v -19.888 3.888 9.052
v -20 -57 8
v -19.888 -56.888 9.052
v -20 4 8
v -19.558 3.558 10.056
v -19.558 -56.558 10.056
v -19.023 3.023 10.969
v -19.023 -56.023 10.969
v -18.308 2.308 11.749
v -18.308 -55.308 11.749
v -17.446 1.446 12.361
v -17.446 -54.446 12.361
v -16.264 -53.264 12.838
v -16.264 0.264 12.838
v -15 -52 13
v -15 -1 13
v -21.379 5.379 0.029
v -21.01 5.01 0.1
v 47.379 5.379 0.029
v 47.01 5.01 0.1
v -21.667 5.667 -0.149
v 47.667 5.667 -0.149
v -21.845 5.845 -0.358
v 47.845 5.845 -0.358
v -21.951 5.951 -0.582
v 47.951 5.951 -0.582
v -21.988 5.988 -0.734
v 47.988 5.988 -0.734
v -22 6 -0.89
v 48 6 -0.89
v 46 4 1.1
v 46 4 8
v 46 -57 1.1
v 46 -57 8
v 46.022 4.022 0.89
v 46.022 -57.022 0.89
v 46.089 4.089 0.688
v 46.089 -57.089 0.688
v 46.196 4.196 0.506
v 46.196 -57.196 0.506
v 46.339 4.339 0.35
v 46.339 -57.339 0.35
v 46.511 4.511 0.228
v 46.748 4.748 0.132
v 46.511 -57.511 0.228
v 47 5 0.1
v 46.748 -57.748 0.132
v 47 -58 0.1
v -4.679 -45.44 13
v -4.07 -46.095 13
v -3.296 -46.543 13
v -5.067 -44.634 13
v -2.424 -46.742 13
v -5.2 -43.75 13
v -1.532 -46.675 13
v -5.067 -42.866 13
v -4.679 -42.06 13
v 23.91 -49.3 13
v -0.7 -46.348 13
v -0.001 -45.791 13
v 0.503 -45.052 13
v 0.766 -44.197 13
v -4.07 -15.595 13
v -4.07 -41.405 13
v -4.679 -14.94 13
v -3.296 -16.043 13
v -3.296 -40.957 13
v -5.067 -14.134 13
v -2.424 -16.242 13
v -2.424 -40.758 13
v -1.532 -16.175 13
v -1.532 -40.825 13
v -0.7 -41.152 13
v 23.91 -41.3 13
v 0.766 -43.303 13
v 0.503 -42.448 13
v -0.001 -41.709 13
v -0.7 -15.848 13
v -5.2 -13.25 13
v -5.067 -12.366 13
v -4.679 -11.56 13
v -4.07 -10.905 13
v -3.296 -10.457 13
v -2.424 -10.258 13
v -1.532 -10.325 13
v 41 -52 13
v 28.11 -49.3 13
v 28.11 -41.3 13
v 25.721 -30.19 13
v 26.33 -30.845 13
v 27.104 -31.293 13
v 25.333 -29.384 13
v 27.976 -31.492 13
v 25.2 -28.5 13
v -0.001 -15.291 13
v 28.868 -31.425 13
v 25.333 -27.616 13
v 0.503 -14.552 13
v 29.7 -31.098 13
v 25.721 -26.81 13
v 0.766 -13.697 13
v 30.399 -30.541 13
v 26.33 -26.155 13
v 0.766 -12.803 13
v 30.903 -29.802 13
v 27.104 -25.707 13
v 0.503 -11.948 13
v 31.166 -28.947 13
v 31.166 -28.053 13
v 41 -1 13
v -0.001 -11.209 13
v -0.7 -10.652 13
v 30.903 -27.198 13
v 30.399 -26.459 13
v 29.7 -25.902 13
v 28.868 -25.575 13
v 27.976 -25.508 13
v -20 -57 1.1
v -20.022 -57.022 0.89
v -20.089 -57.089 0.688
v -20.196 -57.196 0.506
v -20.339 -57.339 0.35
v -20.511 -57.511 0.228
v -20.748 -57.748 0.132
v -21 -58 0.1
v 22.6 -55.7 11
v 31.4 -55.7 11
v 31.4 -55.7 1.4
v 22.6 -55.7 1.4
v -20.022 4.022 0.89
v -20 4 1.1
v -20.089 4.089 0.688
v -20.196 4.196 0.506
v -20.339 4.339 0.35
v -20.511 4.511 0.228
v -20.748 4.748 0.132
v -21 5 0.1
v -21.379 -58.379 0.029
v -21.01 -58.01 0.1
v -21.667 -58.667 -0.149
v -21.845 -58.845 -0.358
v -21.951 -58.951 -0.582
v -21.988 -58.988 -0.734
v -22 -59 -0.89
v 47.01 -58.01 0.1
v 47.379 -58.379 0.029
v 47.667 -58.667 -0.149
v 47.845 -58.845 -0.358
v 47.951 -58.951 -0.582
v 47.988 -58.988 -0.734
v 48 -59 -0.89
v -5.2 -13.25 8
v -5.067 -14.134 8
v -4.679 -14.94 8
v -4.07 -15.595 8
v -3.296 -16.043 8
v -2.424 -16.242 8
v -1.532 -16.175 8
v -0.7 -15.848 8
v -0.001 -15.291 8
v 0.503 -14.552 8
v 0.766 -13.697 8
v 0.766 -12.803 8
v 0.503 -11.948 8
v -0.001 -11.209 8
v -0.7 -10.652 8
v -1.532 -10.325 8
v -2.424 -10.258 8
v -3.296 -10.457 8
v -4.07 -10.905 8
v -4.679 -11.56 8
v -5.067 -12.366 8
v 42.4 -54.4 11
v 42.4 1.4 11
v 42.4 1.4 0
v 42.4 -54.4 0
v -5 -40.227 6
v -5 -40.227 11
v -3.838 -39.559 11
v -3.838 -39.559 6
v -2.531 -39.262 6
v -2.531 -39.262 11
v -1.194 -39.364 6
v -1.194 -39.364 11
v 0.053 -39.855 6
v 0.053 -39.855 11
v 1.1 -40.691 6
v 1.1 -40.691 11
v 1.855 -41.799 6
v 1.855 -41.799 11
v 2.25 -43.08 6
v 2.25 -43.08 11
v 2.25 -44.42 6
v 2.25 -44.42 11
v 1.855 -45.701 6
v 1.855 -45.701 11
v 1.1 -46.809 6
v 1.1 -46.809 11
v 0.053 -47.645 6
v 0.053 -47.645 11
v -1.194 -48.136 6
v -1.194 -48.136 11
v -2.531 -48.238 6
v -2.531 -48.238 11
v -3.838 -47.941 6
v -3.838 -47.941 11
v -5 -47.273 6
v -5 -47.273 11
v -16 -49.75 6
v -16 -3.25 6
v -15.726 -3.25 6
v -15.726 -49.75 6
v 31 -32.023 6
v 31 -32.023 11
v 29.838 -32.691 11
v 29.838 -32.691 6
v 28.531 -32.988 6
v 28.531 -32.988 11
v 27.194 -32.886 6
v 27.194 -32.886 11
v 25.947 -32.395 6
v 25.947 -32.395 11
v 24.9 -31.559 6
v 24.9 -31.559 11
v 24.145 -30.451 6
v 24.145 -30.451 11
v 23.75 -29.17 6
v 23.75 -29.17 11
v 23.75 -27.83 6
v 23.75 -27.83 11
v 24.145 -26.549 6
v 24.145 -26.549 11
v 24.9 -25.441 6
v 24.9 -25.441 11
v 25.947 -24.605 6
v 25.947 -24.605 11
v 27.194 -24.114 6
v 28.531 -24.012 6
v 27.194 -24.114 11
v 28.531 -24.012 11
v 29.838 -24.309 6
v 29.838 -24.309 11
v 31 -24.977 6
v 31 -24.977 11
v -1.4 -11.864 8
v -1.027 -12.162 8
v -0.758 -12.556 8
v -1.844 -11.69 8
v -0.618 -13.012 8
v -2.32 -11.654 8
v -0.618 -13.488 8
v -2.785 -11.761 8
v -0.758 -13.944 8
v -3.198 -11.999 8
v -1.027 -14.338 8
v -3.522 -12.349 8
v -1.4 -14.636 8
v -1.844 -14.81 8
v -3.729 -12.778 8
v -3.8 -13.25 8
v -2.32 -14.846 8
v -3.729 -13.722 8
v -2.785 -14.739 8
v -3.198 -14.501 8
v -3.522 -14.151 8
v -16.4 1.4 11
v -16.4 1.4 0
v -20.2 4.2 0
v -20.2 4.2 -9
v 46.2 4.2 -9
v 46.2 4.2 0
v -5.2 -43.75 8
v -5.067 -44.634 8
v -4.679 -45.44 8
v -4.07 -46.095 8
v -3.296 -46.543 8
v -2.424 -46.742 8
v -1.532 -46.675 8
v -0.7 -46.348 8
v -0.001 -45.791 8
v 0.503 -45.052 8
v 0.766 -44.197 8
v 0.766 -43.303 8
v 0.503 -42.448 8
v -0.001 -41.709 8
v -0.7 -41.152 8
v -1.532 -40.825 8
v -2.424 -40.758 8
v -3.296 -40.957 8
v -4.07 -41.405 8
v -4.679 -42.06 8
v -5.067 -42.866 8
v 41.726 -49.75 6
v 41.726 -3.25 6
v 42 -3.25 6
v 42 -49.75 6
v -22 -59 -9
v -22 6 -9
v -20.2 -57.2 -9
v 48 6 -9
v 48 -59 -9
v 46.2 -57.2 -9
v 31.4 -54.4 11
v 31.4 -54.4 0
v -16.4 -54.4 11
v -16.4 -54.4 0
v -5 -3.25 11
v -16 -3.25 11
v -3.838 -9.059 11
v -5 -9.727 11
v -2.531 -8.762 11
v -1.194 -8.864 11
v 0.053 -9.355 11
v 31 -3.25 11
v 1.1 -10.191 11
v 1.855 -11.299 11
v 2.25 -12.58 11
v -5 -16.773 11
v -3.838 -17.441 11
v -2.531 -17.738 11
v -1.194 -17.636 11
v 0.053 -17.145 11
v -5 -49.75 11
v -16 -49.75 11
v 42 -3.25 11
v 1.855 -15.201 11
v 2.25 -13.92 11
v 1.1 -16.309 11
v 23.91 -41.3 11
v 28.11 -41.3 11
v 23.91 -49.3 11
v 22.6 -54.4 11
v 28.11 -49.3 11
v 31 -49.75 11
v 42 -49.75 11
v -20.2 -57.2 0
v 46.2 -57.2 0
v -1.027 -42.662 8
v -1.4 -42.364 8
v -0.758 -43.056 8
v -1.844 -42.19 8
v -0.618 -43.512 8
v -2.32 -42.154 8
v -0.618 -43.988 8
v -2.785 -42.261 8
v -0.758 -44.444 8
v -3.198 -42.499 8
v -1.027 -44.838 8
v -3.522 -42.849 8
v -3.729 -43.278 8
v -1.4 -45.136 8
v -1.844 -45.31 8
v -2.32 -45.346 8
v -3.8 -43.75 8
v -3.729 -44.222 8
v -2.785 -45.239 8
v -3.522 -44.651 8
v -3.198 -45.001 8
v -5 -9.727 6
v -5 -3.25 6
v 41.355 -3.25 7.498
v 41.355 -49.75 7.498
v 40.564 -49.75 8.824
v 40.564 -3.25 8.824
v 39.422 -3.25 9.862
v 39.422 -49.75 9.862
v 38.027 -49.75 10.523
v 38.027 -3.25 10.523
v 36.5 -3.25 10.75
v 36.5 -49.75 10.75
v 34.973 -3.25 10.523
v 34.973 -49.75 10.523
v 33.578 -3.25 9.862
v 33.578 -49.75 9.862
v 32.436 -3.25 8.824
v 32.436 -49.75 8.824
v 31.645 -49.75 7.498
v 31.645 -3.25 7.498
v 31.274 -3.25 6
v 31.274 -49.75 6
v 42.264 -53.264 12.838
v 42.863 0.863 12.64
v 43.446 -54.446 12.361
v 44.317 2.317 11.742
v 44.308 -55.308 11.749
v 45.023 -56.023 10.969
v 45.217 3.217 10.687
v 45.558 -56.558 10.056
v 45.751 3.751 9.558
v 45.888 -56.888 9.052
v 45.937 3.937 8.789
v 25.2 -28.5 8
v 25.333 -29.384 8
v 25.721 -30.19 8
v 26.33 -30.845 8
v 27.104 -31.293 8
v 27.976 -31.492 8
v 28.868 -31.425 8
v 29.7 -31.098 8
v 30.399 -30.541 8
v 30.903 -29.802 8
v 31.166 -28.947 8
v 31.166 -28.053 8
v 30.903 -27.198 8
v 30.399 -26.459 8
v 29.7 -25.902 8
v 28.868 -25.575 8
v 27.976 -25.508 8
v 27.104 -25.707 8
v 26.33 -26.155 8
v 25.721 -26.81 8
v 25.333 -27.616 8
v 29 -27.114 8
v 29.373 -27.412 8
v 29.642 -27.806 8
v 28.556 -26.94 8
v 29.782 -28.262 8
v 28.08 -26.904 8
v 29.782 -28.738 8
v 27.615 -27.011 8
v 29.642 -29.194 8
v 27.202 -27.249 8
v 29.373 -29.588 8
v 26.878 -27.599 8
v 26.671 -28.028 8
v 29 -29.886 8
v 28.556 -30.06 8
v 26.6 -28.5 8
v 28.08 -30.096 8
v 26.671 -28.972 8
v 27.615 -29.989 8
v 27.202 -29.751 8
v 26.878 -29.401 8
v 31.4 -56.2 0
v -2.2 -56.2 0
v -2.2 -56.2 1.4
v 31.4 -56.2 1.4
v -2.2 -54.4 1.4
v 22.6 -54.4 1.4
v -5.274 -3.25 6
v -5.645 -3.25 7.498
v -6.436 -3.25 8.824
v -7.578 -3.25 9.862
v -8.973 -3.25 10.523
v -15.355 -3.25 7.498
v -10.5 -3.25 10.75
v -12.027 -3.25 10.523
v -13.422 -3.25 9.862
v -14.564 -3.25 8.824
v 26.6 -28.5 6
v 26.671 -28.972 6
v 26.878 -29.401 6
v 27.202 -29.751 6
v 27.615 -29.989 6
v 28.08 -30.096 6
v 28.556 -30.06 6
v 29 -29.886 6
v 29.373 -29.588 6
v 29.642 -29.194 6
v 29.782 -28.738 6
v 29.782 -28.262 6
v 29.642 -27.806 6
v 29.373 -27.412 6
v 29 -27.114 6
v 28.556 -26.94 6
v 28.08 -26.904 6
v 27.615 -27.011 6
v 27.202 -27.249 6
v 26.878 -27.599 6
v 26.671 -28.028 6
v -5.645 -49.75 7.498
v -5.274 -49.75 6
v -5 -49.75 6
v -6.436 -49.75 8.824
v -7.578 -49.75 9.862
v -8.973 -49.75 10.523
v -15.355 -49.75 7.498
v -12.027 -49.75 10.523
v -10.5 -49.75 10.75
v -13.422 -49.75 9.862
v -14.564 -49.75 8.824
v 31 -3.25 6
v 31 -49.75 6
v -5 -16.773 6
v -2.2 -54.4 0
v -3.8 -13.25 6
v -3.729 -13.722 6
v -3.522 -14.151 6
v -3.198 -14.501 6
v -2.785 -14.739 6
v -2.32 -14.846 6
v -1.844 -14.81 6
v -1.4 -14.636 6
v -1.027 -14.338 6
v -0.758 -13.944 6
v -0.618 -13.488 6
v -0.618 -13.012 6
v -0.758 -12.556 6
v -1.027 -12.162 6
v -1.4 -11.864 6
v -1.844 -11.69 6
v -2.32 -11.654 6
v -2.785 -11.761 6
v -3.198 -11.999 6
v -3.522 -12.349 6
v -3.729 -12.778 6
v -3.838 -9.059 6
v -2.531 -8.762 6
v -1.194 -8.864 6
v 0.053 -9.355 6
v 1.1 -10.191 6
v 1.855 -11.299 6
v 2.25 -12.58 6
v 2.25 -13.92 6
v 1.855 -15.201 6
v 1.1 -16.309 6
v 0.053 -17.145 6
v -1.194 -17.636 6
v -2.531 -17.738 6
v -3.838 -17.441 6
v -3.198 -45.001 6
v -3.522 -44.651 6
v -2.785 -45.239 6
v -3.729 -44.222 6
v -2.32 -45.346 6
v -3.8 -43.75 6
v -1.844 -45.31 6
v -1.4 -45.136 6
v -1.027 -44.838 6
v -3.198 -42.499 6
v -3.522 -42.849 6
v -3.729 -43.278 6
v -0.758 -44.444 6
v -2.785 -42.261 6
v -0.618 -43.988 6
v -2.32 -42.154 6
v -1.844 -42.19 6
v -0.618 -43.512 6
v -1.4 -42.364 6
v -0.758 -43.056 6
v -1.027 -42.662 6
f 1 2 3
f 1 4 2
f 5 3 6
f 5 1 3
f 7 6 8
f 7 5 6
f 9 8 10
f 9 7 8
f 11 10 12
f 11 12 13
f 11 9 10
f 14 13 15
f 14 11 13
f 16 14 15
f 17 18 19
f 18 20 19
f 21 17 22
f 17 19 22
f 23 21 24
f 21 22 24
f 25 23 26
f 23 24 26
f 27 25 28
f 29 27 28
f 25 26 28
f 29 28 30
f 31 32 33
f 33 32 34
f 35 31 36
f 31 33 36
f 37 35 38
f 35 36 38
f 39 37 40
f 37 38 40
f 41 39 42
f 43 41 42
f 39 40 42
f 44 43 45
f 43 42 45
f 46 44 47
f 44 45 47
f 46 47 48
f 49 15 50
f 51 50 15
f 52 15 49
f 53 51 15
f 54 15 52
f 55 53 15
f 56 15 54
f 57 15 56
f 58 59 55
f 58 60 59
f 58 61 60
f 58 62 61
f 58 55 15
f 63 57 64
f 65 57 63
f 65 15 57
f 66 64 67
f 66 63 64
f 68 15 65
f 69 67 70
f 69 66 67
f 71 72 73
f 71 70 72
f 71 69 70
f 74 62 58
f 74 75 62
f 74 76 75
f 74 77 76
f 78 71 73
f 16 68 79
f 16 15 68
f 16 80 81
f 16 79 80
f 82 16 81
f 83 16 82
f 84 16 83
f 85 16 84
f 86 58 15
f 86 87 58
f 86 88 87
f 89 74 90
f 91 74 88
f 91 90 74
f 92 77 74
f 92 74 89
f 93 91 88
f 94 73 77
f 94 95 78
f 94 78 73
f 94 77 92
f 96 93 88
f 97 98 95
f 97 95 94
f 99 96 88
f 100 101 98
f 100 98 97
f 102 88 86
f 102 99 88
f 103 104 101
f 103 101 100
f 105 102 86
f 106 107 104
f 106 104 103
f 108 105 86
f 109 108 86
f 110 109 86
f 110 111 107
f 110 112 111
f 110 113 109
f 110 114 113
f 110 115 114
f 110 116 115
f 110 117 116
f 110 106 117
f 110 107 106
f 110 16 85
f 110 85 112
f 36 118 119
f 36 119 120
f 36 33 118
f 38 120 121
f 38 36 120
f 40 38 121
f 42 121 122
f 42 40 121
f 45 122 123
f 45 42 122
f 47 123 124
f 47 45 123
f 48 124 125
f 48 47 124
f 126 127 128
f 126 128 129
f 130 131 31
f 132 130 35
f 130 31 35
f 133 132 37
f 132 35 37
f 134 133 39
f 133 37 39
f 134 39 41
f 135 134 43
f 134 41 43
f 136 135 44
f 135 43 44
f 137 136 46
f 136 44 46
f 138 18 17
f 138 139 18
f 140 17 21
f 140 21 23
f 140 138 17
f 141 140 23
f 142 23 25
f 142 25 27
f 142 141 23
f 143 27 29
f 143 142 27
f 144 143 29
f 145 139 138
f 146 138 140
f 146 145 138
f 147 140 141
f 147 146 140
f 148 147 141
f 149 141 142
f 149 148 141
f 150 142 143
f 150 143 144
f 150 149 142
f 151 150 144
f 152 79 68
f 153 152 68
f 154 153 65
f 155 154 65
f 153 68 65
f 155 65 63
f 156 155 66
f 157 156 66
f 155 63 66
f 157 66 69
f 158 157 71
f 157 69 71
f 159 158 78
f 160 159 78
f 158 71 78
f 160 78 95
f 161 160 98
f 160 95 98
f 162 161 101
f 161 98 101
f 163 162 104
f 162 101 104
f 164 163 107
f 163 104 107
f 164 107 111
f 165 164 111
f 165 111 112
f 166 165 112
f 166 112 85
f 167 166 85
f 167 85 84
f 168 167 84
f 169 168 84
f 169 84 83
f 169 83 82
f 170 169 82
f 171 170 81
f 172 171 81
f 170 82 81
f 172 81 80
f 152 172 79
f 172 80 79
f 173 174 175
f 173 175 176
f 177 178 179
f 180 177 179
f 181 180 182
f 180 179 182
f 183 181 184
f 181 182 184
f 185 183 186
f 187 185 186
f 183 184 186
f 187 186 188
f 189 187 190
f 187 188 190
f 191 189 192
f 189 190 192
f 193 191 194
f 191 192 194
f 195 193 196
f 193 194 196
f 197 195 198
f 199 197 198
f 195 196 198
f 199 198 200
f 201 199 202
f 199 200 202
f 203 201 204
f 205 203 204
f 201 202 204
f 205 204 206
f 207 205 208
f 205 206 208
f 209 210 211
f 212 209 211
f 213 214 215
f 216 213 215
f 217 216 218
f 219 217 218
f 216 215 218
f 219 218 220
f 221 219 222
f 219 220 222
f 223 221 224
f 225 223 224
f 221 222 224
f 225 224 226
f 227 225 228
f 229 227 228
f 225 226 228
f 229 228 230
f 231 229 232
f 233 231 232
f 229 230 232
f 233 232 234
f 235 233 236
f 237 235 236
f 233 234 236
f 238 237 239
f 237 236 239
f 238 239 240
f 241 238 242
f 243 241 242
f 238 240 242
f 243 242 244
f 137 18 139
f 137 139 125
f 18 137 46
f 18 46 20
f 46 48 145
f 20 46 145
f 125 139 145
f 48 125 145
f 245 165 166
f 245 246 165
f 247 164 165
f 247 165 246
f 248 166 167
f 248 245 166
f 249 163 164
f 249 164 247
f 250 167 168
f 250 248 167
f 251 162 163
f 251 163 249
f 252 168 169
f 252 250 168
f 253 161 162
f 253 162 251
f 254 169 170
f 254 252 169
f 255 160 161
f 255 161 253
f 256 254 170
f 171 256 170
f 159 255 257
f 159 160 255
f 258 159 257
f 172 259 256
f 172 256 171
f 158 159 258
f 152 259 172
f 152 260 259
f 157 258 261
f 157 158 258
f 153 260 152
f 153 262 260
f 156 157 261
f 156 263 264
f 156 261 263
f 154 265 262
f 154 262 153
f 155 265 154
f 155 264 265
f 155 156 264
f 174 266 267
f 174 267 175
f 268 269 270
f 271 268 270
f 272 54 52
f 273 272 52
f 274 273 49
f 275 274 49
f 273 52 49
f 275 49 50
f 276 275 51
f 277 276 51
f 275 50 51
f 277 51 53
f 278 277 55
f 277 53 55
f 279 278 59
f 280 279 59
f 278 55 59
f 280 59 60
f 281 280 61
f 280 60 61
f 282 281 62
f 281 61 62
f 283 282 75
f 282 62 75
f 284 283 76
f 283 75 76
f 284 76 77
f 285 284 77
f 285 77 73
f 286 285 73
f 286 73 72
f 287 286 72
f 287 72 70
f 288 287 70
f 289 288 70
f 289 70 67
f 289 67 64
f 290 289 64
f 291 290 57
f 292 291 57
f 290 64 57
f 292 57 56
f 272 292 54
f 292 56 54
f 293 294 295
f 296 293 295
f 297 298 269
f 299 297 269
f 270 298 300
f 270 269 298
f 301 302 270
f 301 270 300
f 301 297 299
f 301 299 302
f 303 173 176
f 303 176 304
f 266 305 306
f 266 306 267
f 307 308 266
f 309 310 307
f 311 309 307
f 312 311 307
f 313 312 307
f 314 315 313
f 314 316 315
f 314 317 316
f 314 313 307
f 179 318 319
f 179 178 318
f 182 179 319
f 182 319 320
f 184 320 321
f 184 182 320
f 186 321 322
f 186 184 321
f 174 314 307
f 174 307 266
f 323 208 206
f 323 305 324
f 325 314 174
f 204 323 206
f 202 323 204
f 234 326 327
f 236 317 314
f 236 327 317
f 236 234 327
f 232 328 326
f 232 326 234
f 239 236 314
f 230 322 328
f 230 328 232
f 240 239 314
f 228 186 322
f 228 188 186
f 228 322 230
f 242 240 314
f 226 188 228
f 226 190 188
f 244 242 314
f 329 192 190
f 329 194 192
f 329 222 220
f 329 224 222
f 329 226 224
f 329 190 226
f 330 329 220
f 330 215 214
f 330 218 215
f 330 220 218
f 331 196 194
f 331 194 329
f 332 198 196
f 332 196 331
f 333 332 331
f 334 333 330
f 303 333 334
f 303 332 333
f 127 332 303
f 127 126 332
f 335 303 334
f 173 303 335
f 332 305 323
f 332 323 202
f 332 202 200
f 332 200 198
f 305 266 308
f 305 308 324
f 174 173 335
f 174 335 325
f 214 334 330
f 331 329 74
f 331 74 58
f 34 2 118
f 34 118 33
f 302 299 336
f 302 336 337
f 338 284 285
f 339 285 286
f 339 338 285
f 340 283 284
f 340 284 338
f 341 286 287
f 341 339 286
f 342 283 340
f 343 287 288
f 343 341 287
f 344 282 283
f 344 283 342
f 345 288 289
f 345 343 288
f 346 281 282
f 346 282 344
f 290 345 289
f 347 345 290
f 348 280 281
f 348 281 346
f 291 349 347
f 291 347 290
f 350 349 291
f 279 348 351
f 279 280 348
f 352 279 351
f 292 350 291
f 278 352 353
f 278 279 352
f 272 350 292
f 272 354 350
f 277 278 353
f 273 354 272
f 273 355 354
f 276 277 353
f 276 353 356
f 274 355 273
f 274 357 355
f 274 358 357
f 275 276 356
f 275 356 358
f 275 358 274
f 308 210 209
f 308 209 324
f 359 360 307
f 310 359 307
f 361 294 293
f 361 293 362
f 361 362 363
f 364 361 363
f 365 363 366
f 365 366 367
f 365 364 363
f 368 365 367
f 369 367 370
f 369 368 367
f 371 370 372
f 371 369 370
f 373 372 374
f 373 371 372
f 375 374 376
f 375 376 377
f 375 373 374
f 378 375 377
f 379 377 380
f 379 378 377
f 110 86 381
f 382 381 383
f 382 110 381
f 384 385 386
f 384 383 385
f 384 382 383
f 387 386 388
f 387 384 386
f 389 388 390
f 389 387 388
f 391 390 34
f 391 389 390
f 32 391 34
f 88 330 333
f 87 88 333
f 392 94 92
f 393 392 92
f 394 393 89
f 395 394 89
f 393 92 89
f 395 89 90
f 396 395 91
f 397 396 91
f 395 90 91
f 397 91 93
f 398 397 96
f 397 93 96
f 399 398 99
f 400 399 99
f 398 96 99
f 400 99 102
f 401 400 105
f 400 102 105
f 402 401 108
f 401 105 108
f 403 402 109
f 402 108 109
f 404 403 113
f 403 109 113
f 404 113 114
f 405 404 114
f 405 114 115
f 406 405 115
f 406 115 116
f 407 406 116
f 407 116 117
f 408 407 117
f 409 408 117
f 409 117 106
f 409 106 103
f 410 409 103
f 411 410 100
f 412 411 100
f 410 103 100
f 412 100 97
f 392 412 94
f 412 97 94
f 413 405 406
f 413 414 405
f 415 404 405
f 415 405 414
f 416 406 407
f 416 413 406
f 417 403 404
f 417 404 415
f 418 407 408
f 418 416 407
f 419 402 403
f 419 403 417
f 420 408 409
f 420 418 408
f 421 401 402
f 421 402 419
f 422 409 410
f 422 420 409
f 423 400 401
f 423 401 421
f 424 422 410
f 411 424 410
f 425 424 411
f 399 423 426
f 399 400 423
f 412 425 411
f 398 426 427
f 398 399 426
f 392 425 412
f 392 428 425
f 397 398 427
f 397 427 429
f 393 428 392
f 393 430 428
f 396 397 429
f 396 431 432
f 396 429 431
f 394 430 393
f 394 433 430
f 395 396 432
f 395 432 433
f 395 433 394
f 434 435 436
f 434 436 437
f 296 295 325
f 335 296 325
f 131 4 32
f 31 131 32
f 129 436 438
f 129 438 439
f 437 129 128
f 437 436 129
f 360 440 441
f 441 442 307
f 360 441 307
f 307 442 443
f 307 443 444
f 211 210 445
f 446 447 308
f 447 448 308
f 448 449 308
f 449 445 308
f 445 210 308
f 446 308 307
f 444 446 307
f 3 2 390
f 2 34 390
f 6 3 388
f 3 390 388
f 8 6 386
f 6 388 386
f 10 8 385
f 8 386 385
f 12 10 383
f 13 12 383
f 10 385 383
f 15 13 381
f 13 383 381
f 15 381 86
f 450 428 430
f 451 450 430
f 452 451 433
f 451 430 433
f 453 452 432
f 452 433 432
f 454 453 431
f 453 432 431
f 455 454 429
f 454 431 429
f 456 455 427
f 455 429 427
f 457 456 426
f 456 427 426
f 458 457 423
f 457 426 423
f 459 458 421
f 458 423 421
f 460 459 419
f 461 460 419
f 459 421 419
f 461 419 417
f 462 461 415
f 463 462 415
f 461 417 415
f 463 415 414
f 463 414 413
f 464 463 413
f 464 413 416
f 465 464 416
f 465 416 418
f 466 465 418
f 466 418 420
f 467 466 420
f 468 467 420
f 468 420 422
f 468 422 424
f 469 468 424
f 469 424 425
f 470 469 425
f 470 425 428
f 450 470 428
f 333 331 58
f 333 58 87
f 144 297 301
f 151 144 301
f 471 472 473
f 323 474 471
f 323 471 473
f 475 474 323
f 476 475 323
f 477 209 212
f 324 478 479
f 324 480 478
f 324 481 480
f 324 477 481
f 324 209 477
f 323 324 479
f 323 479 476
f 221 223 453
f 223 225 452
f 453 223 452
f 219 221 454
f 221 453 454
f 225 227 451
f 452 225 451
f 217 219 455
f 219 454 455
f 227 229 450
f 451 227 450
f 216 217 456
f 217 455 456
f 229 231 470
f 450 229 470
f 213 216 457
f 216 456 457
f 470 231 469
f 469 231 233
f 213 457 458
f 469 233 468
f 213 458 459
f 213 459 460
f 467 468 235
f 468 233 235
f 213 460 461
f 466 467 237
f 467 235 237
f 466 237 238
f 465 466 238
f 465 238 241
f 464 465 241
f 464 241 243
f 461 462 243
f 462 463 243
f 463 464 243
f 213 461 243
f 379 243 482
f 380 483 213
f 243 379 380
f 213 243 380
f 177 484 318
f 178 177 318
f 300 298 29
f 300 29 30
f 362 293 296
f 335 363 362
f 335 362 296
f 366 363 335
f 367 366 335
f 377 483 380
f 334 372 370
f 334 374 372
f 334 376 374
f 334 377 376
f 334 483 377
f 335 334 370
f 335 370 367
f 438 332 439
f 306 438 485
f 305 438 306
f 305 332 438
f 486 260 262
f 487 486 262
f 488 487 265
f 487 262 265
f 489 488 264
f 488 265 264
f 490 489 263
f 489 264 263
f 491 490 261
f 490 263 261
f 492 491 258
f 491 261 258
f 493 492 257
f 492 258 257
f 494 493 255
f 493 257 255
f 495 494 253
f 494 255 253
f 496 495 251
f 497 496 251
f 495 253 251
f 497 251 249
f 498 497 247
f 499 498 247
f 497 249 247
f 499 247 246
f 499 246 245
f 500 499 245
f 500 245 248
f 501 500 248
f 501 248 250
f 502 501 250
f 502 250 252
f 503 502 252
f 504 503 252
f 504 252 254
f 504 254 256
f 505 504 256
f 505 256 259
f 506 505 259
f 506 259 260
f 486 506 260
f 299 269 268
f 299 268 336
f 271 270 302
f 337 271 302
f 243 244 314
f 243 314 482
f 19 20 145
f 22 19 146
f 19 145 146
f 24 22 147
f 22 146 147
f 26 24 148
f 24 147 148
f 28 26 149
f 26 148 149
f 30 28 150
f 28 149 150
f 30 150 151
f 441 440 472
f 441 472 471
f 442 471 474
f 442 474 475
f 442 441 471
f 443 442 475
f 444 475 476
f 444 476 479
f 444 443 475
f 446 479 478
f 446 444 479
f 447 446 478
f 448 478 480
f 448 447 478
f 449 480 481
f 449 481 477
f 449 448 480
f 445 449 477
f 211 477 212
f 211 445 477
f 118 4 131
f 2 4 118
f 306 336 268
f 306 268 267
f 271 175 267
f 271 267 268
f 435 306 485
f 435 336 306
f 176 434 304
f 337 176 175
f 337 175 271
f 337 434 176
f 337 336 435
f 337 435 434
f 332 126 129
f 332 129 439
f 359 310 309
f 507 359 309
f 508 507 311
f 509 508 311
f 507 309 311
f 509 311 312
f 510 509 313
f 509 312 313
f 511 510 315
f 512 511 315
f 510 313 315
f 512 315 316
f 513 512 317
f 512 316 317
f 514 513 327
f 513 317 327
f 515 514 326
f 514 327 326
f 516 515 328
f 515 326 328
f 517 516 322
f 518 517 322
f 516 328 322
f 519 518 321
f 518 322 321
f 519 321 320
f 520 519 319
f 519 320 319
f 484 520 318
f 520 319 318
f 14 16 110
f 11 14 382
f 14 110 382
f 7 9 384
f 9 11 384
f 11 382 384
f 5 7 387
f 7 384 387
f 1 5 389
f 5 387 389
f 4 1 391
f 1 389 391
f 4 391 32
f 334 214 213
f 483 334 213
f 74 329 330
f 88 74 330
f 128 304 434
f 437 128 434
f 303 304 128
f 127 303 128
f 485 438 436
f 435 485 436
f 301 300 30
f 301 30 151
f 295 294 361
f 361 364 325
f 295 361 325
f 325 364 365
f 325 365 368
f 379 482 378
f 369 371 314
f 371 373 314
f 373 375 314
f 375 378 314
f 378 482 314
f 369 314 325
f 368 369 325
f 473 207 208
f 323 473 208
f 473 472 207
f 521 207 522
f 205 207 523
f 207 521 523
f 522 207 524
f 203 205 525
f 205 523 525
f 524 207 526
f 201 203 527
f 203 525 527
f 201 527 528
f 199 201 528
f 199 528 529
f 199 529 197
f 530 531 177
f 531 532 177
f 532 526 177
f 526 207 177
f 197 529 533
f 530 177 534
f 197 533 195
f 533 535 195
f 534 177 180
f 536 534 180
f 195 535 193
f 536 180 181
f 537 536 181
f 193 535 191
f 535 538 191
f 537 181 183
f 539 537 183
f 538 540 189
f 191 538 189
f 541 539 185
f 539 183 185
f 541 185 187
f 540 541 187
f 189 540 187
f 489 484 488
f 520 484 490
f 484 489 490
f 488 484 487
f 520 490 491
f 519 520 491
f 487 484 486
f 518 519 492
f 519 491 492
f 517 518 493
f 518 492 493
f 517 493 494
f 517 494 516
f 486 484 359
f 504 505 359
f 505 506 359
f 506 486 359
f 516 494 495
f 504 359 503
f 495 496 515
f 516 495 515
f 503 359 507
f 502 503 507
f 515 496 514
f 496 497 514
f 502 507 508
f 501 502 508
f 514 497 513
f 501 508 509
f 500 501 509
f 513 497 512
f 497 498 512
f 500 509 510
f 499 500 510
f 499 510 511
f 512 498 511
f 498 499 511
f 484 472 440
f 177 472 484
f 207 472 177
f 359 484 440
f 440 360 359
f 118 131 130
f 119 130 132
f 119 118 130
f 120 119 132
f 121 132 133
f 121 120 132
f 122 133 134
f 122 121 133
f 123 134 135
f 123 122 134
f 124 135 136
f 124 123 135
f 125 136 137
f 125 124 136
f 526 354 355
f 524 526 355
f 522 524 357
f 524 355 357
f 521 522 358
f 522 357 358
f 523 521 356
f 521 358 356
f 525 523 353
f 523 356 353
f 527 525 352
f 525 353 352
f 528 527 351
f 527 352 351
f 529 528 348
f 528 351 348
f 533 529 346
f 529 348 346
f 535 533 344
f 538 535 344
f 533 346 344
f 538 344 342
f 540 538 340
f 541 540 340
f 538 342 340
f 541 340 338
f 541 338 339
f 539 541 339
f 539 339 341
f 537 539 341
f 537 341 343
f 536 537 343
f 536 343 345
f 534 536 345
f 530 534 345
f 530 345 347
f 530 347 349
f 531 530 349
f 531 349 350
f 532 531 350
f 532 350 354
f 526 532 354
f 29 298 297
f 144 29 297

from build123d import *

# Parameters (mm, degrees)
PAD007_DEPTH      = 46.5
SKETCH012_W       = 58
SKETCH012_H       = 2
PAD008_DEPTH      = 46.5
SKETCH013_W       = 2
SKETCH013_H       = 46.5
PAD009_DEPTH      = 62
SKETCH014_W       = 2
SKETCH014_H       = 46.5
PAD010_DEPTH      = 4
SKETCH015_W       = 66
SKETCH015_H       = 2
PAD011_DEPTH      = 7.25
SKETCH016_W       = 66
SKETCH016_H       = 2
PAD012_DEPTH      = 7.25
SKETCH017_W       = 66
SKETCH017_H       = 61
PAD013_DEPTH      = 9.8
SKETCH018_W       = 66
SKETCH018_H       = 61
PAD014_DEPTH      = 1.2
PAD015_DEPTH      = 5
SKETCH020_R       = 2.8
POCKET003_DEPTH   = 5
SKETCH021_R       = 1.5
POCKET004_DEPTH   = 8
SKETCH031_W       = 3.2
SKETCH031_H       = 7
POCKET010_DEPTH   = 5
FILLET_R          = 5
POCKET011_DEPTH   = 11
SKETCH034_W       = 33.6
SKETCH034_H       = 1.8
POCKET012_DEPTH   = 1.4
SKETCH035_W       = 70
SKETCH035_H       = 65
SKETCH035_W_2     = 66
SKETCH035_H_2     = 61
PAD019_DEPTH      = 9
PAD019_DEPTH_BACK = 0.1
FILLET001_R       = 1
FILLET002_R       = 0.99
SKETCH036_W       = 66.4
SKETCH036_H       = 61.4
POCKET013_DEPTH   = 9
SKETCH037_W       = 4.2
SKETCH037_H       = 8
POCKET014_DEPTH   = 5
SKETCH038_R       = 3
POCKET015_DEPTH   = 5
SKETCH039_R       = 1.6
POCKET016_DEPTH   = 5


with BuildPart() as part:
    # Sketch011 (on DatumPlane) → Pad007 (new body)
    with BuildSketch(Plane.XZ.offset(3.25)):
        with BuildLine():
            Line((-5, 11), (-16, 11))
            Line((-16, 11), (-16, 6))
            Line((-16, 6), (-15.726136, 6))
            ThreePointArc((-5.273864, 6), (-10.5, 10.75), (-15.726136, 6))
            Line((-5.273864, 6), (-5, 6))
            Line((-5, 6), (-5, 11))
        make_face()
    extrude(amount=PAD007_DEPTH)

    # Sketch012 (on DatumPlane) → Pad008 (join)
    with BuildSketch(Plane.XZ.offset(3.25)):
        with BuildLine():
            Line((42, 11), (31, 11))
            Line((31, 11), (31, 6))
            Line((31, 6), (31.273864, 6))
            ThreePointArc((41.726136, 6), (36.5, 10.75), (31.273864, 6))
            Line((41.726136, 6), (42, 6))
            Line((42, 6), (42, 11))
        make_face()
        with Locations((13, 12)):
            Rectangle(SKETCH012_W, SKETCH012_H)
    extrude(amount=PAD008_DEPTH)

    # Sketch013 (on Face17 of Pad008) → Pad009 (join)
    with BuildSketch(Plane(origin=(42, -3.25, 0), x_dir=(0, 0, 1), z_dir=(1, 0, 0))):
        with Locations((12, 23.25)):
            Rectangle(SKETCH013_W, SKETCH013_H)
    extrude(amount=-PAD009_DEPTH)

    # Sketch014 (on Face17 of Pad009) → Pad010 (join)
    with BuildSketch(Plane(origin=(42, -3.25, 0), x_dir=(0, 0, 1), z_dir=(1, 0, 0))):
        with Locations((12, 23.25)):
            Rectangle(SKETCH014_W, SKETCH014_H)
    extrude(amount=PAD010_DEPTH)

    # Sketch015 (on Face10 of Pad010) → Pad011 (join)
    with BuildSketch(Plane(origin=(0, -3.25, 0), x_dir=(1, 0, 0), z_dir=(0, 1, 0))):
        with Locations((13, -12)):
            Rectangle(SKETCH015_W, SKETCH015_H)
    extrude(amount=PAD011_DEPTH)

    # Sketch016 (on Face12 of Pad011) → Pad012 (join)
    with BuildSketch(Plane.XZ.offset(49.75)):
        with Locations((13, 12)):
            Rectangle(SKETCH016_W, SKETCH016_H)
    extrude(amount=PAD012_DEPTH)

    # Sketch017 (on Face14 of Pad012) → Pad013 (join)
    with BuildSketch(Plane(origin=(0, -3.25, 11), x_dir=(1, 0, 0), z_dir=(0, 0, -1))):
        with Locations((13, 23.25)):
            Rectangle(SKETCH017_W, SKETCH017_H)
        Polygon((42.2, -4.45), (-16.2, -4.45), (-16.2, 50.95), (22.8, 50.95), (22.8, 52.25), (31.2, 52.25), (31.2, 50.95), (42.2, 50.95), align=None, mode=Mode.SUBTRACT)
    extrude(amount=PAD013_DEPTH)

    # Sketch018 (on Face18 of Pad013) → Pad014 (join)
    with BuildSketch(Plane(origin=(0, -3.25, 1.2), x_dir=(1, 0, 0), z_dir=(0, 0, -1))):
        with Locations((13, 23.25)):
            Rectangle(SKETCH018_W, SKETCH018_H)
        Polygon((-2.2, 52.95), (31.2, 52.95), (31.2, 50.95), (42.2, 50.95), (42.2, -4.45), (-16.2, -4.45), (-16.2, 50.95), (-2.2, 50.95), align=None, mode=Mode.SUBTRACT)
    extrude(amount=PAD014_DEPTH)

    # Sketch019 (on Face13 of Pad014) → Pad015 (join)
    with BuildSketch(Plane(origin=(0, -3.25, 11), x_dir=(1, 0, 0), z_dir=(0, 0, -1))):
        with BuildLine():
            ThreePointArc((-5, 36.977217), (2.3, 40.5), (-5, 44.022783))
            Line((-5, 44.022783), (-5, 36.977217))
        make_face()
        with BuildLine():
            ThreePointArc((-5, 6.477217), (2.3, 10), (-5, 13.522783))
            Line((-5, 13.522783), (-5, 6.477217))
        make_face()
        with BuildLine():
            ThreePointArc((31, 28.772783), (23.7, 25.25), (31, 21.727217))
            Line((31, 28.772783), (31, 21.727217))
        make_face()
    extrude(amount=PAD015_DEPTH)

    # Sketch020 (on Face67 of Pad015) → Pocket003 (cut)
    with BuildSketch(Plane(origin=(0, -3.25, 13), x_dir=(-1, 0, 0), z_dir=(0, 0, 1))):
        with Locations((2.2, 40.5)):
            Circle(SKETCH020_R)
        with Locations((2.2, 10)):
            Circle(SKETCH020_R)
        with Locations((-28.2, 25.25)):
            Circle(SKETCH020_R)
    extrude(amount=-POCKET003_DEPTH, mode=Mode.SUBTRACT)

    # Sketch021 (on Face67 of Pocket003) → Pocket004 (cut)
    with BuildSketch(Plane(origin=(0, -3.25, 13), x_dir=(-1, 0, 0), z_dir=(0, 0, 1))):
        with Locations((-28.2, 25.25)):
            Circle(SKETCH021_R)
        with Locations((2.2, 10)):
            Circle(SKETCH021_R)
        with Locations((2.2, 40.5)):
            Circle(SKETCH021_R)
    extrude(amount=-POCKET004_DEPTH, mode=Mode.SUBTRACT)

    # Sketch031 (on Face14 of Pocket004) → Pocket010 (cut)
    with BuildSketch(Plane(origin=(0, -3.25, 11), x_dir=(1, 0, 0), z_dir=(0, 0, -1))):
        with Locations((26.01, 42.05)):
            Rectangle(SKETCH031_W, SKETCH031_H)
    extrude(amount=-POCKET010_DEPTH, mode=Mode.SUBTRACT)

    # Fillet
    fillet_edges = [part.edges().sort_by_distance(p)[0] for p in [
        (-20, -26.5, 13),
        (-20, -53.375, 13),
        (13, -57, 13),
        (46, -53.375, 13),
        (46, -26.5, 13),
        (46, 0.375, 13),
        (13, 4, 13),
        (-20, 0.375, 13),
    ]]
    fillet(fillet_edges, radius=FILLET_R)

    # Sketch033 (on Face30 of Fillet) → Pocket011 (cut)
    with BuildSketch(Plane(origin=(0, -3.25, 11), x_dir=(1, 0, 0), z_dir=(0, 0, -1))):
        Polygon((22.6, 51.15), (-16.4, 51.15), (-16.4, -4.65), (42.4, -4.65), (42.4, 51.15), (31.4, 51.15), (31.4, 52.45), (22.6, 52.45), align=None)
        Polygon((-16.2, 50.95), (-16.2, -4.45), (42.2, -4.45), (42.2, 50.95), (31.2, 50.95), (31.2, 52.25), (22.8, 52.25), (22.8, 50.95), align=None, mode=Mode.SUBTRACT)
    extrude(amount=POCKET011_DEPTH, mode=Mode.SUBTRACT)

    # Sketch034 (on Face44 of Pocket011) → Pocket012 (cut)
    with BuildSketch(Plane(origin=(0, -3.25, 0), x_dir=(1, 0, 0), z_dir=(0, 0, -1))):
        with Locations((14.6, 52.05)):
            Rectangle(SKETCH034_W, SKETCH034_H)
    extrude(amount=-POCKET012_DEPTH, mode=Mode.SUBTRACT)

    # Sketch035 (on Face44 of Pocket012) → Pad019 (join, two sides)
    with BuildSketch(Plane(origin=(0, -3.25, 0), x_dir=(1, 0, 0), z_dir=(0, 0, -1))) as pad019_sk:
        with Locations((13, 23.25)):
            Rectangle(SKETCH035_W, SKETCH035_H)
        with Locations((13, 23.25)):
            Rectangle(SKETCH035_W_2, SKETCH035_H_2, mode=Mode.SUBTRACT)
    extrude(amount=PAD019_DEPTH)
    extrude(pad019_sk.sketch, amount=-PAD019_DEPTH_BACK)

    # Fillet001
    fillet001_edges = [part.edges().sort_by_distance(p)[0] for p in [
        (46, -26.5, 0.1),
        (13, 4, 0.1),
        (-20, -26.5, 0.1),
        (13, -57, 0.1),
    ]]
    fillet(fillet001_edges, radius=FILLET001_R)

    # Fillet002
    fillet002_edges = [part.edges().sort_by_distance(p)[0] for p in [
        (13, 6, 0.1),
        (-22, -26.5, 0.1),
        (48, -26.5, 0.1),
        (13, -59, 0.1),
    ]]
    fillet(fillet002_edges, radius=FILLET002_R)

    # Sketch036 (on Face18 of Fillet002) → Pocket013 (cut)
    with BuildSketch(Plane(origin=(0, -3.25, -9), x_dir=(1, 0, 0), z_dir=(0, 0, -1))):
        with Locations((13, 23.25)):
            Rectangle(SKETCH036_W, SKETCH036_H)
    extrude(amount=-POCKET013_DEPTH, mode=Mode.SUBTRACT)

    # Sketch037 (on Face58 of Pocket013) → Pocket014 (cut)
    with BuildSketch(Plane(origin=(0, -3.25, 11), x_dir=(1, 0, 0), z_dir=(0, 0, -1))):
        with Locations((26.01, 42.05)):
            Rectangle(SKETCH037_W, SKETCH037_H)
    extrude(amount=-POCKET014_DEPTH, mode=Mode.SUBTRACT)

    # Sketch038 (on Face37 of Pocket014) → Pocket015 (cut)
    with BuildSketch(Plane(origin=(0, -3.25, 13), x_dir=(-1, 0, 0), z_dir=(0, 0, 1))):
        with Locations((2.2, 40.5)):
            Circle(SKETCH038_R)
        with Locations((-28.2, 25.25)):
            Circle(SKETCH038_R)
        with Locations((2.2, 10)):
            Circle(SKETCH038_R)
    extrude(amount=-POCKET015_DEPTH, mode=Mode.SUBTRACT)

    # Sketch039 (on Face66 of Pocket015) → Pocket016 (cut)
    with BuildSketch(Plane(origin=(0, -3.25, 8), x_dir=(-1, 0, 0), z_dir=(0, 0, 1))):
        with Locations((2.2, 40.5)):
            Circle(SKETCH039_R)
        with Locations((-28.2, 25.25)):
            Circle(SKETCH039_R)
        with Locations((2.2, 10)):
            Circle(SKETCH039_R)
    extrude(amount=-POCKET016_DEPTH, mode=Mode.SUBTRACT)


solid = part.part
